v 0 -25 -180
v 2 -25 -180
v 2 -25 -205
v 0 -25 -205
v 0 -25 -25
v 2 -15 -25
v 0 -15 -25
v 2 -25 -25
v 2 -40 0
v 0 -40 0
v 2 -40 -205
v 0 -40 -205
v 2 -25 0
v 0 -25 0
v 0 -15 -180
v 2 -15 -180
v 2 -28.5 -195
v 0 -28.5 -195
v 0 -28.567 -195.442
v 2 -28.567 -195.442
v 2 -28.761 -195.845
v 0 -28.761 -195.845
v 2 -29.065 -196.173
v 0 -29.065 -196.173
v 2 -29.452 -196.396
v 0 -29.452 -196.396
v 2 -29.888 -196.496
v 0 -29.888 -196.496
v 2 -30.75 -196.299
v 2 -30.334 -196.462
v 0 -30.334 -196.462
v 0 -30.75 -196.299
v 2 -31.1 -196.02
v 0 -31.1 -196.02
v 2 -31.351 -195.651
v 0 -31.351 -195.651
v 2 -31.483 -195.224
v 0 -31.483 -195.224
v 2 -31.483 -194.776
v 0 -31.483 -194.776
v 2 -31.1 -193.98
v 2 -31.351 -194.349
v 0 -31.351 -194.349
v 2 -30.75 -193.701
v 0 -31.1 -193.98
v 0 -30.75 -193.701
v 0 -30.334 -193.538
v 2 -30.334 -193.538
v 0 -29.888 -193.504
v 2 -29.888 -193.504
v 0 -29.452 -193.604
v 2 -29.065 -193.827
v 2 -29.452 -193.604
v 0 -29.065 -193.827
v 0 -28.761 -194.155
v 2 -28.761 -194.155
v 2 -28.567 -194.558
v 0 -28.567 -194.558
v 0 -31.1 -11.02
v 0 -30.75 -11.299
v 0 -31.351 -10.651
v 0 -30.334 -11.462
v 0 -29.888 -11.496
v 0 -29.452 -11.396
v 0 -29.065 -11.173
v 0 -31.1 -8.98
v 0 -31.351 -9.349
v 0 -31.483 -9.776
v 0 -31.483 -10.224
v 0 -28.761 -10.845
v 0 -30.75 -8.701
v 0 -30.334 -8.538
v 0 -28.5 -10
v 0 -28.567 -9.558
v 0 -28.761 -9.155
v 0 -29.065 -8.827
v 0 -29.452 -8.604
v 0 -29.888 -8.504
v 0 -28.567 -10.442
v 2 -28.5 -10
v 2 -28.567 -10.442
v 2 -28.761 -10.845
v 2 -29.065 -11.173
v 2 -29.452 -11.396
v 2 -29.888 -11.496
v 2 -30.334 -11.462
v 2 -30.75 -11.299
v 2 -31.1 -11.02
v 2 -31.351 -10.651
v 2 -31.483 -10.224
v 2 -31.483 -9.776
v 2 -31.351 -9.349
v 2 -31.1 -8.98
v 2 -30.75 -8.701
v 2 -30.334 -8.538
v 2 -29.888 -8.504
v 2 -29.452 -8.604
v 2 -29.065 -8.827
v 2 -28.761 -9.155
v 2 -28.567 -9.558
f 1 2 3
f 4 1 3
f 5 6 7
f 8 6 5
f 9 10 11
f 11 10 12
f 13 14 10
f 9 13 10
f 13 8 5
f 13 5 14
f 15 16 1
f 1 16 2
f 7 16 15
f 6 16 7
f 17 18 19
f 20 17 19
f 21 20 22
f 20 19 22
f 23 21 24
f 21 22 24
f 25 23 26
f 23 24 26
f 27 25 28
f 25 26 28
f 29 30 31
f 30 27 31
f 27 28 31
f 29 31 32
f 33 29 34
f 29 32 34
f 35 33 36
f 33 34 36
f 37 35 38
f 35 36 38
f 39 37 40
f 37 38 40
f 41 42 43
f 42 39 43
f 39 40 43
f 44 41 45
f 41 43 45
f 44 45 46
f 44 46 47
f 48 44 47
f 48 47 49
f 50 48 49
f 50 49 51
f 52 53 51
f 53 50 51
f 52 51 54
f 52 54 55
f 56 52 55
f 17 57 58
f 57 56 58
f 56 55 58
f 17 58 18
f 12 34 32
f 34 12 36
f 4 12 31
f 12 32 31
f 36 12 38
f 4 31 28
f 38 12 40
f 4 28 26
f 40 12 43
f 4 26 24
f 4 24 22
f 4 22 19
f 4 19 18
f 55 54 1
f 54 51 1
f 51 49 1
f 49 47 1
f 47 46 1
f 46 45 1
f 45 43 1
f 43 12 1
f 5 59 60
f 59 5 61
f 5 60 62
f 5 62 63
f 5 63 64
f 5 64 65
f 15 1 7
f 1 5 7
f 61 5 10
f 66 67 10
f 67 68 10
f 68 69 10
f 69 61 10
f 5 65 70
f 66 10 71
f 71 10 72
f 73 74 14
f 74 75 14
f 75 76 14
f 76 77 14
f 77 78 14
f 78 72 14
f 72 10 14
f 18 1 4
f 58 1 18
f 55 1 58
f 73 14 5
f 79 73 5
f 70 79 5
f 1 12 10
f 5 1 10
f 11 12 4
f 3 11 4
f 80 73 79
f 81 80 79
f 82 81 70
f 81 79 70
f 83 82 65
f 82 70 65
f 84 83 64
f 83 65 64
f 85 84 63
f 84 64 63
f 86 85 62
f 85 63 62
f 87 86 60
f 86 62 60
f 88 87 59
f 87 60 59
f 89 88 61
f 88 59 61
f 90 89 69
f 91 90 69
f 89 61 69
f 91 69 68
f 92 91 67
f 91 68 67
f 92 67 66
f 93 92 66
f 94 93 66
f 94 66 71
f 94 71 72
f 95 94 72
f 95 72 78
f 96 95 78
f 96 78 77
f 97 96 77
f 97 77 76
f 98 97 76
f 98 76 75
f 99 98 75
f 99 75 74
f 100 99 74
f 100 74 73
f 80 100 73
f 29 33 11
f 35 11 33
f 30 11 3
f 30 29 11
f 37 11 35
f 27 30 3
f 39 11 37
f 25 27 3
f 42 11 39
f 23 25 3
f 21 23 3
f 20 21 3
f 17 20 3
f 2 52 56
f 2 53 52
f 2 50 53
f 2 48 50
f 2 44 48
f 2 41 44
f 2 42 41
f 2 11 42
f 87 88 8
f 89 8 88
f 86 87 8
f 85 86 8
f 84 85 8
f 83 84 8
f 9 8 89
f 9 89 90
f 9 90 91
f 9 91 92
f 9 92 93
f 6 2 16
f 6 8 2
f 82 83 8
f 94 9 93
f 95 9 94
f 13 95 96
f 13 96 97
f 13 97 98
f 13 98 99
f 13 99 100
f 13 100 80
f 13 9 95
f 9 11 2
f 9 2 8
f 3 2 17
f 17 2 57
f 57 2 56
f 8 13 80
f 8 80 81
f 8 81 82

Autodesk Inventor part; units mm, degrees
ref_plane "YZ Plane" through (0, 0, 0) normal (1, 0, 0) x (0, 1, 0)
ref_plane "XZ Plane" through (0, 0, 0) normal (0, 1, 0) x (-1, 0, 0)
ref_plane "XY Plane" through (0, 0, 0) normal (0, 0, 1) x (1, 0, 0)
sketch "Sketch2" plane through (0, 0, 0) normal (1, 0, 0) x (0, 1, 0)
  line L0 (0, 0) -> (-40, 0)
  line L1 (-40, 0) -> (-40, -205)
  line L2 (-40, -205) -> (0, -205)
  line L3 (0, -205) -> (0, 0)
  line L4 (0, 0) -> (0, -5)
  line L5 (0, -5) -> (-5, -5)
  circle A0 centre (-5, -5) radius 1.5
  line L6 (-5, -5) -> (-5, -15)
  circle A1 centre (-5, -15) radius 1.5
  line L7 (0, -102.5) -> (-40, -102.5)
  circle A2 centre (-5, -200) radius 1.5
  circle A3 centre (-5, -190) radius 1.5
  line L8 (-40, 0) -> (-40, -10)
  line L9 (-40, -10) -> (-30, -10)
  line L10 (-30, -10) -> (-20, -10)
  circle A4 centre (-20, -10) radius 1.5
  circle A5 centre (-30, -10) radius 1.5
  circle A6 centre (-20, -195) radius 1.5
  circle A7 centre (-30, -195) radius 1.5
  dimension "d11" = 40
  dimension "d12" = 205
  dimension "d13" = 5
  dimension "d14" = 5
  dimension "d15" = 3
  dimension "d16" = 10
  dimension "d17" = 3
  dimension "d18" = 10
  dimension "d19" = 10
  dimension "d20" = 10
  dimension "d21" = 3
  dimension "d22" = 3
extrude "Extrusion3" add sketch "Sketch2" along normal blind 2
sketch "Sketch3" plane through (2, 0, 0) normal (1, 0, 0) x (0, 0, -1)
  line L0 (205, -40) -> (205, 0) projected
  line L1 (0, 0) -> (205, 0)
  line L2 (205, 0) -> (205, -15)
  line L3 (205, -15) -> (0, -15)
  line L4 (0, -15) -> (0, 0)
  dimension "d25" = 15
extrude "Extrusion4" cut sketch "Sketch3" against normal blind 2
sketch "Sketch4" plane through (2, 0, 0) normal (1, 0, 0) x (0, 0, -1)
  line L0 (0, -15) -> (0, -40) projected
  line L1 (0, -15) -> (25, -15)
  line L2 (0, -15) -> (205, -15) projected
  line L3 (25, -15) -> (25, -25)
  line L4 (25, -25) -> (0, -25)
  line L5 (205, -40) -> (205, -15) projected
  line L6 (205, -15) -> (180, -15)
  line L7 (180, -15) -> (180, -25)
  line L8 (180, -25) -> (205, -25)
  line L9 (205, -25) -> (205, -15)
  point P0 (0, 0)
  dimension "d28" = 25
  dimension "d29" = 10
  dimension "d30" = 25
extrude "Extrusion5" cut sketch "Sketch4" against normal blind 2
properties part number "plateHolder"
